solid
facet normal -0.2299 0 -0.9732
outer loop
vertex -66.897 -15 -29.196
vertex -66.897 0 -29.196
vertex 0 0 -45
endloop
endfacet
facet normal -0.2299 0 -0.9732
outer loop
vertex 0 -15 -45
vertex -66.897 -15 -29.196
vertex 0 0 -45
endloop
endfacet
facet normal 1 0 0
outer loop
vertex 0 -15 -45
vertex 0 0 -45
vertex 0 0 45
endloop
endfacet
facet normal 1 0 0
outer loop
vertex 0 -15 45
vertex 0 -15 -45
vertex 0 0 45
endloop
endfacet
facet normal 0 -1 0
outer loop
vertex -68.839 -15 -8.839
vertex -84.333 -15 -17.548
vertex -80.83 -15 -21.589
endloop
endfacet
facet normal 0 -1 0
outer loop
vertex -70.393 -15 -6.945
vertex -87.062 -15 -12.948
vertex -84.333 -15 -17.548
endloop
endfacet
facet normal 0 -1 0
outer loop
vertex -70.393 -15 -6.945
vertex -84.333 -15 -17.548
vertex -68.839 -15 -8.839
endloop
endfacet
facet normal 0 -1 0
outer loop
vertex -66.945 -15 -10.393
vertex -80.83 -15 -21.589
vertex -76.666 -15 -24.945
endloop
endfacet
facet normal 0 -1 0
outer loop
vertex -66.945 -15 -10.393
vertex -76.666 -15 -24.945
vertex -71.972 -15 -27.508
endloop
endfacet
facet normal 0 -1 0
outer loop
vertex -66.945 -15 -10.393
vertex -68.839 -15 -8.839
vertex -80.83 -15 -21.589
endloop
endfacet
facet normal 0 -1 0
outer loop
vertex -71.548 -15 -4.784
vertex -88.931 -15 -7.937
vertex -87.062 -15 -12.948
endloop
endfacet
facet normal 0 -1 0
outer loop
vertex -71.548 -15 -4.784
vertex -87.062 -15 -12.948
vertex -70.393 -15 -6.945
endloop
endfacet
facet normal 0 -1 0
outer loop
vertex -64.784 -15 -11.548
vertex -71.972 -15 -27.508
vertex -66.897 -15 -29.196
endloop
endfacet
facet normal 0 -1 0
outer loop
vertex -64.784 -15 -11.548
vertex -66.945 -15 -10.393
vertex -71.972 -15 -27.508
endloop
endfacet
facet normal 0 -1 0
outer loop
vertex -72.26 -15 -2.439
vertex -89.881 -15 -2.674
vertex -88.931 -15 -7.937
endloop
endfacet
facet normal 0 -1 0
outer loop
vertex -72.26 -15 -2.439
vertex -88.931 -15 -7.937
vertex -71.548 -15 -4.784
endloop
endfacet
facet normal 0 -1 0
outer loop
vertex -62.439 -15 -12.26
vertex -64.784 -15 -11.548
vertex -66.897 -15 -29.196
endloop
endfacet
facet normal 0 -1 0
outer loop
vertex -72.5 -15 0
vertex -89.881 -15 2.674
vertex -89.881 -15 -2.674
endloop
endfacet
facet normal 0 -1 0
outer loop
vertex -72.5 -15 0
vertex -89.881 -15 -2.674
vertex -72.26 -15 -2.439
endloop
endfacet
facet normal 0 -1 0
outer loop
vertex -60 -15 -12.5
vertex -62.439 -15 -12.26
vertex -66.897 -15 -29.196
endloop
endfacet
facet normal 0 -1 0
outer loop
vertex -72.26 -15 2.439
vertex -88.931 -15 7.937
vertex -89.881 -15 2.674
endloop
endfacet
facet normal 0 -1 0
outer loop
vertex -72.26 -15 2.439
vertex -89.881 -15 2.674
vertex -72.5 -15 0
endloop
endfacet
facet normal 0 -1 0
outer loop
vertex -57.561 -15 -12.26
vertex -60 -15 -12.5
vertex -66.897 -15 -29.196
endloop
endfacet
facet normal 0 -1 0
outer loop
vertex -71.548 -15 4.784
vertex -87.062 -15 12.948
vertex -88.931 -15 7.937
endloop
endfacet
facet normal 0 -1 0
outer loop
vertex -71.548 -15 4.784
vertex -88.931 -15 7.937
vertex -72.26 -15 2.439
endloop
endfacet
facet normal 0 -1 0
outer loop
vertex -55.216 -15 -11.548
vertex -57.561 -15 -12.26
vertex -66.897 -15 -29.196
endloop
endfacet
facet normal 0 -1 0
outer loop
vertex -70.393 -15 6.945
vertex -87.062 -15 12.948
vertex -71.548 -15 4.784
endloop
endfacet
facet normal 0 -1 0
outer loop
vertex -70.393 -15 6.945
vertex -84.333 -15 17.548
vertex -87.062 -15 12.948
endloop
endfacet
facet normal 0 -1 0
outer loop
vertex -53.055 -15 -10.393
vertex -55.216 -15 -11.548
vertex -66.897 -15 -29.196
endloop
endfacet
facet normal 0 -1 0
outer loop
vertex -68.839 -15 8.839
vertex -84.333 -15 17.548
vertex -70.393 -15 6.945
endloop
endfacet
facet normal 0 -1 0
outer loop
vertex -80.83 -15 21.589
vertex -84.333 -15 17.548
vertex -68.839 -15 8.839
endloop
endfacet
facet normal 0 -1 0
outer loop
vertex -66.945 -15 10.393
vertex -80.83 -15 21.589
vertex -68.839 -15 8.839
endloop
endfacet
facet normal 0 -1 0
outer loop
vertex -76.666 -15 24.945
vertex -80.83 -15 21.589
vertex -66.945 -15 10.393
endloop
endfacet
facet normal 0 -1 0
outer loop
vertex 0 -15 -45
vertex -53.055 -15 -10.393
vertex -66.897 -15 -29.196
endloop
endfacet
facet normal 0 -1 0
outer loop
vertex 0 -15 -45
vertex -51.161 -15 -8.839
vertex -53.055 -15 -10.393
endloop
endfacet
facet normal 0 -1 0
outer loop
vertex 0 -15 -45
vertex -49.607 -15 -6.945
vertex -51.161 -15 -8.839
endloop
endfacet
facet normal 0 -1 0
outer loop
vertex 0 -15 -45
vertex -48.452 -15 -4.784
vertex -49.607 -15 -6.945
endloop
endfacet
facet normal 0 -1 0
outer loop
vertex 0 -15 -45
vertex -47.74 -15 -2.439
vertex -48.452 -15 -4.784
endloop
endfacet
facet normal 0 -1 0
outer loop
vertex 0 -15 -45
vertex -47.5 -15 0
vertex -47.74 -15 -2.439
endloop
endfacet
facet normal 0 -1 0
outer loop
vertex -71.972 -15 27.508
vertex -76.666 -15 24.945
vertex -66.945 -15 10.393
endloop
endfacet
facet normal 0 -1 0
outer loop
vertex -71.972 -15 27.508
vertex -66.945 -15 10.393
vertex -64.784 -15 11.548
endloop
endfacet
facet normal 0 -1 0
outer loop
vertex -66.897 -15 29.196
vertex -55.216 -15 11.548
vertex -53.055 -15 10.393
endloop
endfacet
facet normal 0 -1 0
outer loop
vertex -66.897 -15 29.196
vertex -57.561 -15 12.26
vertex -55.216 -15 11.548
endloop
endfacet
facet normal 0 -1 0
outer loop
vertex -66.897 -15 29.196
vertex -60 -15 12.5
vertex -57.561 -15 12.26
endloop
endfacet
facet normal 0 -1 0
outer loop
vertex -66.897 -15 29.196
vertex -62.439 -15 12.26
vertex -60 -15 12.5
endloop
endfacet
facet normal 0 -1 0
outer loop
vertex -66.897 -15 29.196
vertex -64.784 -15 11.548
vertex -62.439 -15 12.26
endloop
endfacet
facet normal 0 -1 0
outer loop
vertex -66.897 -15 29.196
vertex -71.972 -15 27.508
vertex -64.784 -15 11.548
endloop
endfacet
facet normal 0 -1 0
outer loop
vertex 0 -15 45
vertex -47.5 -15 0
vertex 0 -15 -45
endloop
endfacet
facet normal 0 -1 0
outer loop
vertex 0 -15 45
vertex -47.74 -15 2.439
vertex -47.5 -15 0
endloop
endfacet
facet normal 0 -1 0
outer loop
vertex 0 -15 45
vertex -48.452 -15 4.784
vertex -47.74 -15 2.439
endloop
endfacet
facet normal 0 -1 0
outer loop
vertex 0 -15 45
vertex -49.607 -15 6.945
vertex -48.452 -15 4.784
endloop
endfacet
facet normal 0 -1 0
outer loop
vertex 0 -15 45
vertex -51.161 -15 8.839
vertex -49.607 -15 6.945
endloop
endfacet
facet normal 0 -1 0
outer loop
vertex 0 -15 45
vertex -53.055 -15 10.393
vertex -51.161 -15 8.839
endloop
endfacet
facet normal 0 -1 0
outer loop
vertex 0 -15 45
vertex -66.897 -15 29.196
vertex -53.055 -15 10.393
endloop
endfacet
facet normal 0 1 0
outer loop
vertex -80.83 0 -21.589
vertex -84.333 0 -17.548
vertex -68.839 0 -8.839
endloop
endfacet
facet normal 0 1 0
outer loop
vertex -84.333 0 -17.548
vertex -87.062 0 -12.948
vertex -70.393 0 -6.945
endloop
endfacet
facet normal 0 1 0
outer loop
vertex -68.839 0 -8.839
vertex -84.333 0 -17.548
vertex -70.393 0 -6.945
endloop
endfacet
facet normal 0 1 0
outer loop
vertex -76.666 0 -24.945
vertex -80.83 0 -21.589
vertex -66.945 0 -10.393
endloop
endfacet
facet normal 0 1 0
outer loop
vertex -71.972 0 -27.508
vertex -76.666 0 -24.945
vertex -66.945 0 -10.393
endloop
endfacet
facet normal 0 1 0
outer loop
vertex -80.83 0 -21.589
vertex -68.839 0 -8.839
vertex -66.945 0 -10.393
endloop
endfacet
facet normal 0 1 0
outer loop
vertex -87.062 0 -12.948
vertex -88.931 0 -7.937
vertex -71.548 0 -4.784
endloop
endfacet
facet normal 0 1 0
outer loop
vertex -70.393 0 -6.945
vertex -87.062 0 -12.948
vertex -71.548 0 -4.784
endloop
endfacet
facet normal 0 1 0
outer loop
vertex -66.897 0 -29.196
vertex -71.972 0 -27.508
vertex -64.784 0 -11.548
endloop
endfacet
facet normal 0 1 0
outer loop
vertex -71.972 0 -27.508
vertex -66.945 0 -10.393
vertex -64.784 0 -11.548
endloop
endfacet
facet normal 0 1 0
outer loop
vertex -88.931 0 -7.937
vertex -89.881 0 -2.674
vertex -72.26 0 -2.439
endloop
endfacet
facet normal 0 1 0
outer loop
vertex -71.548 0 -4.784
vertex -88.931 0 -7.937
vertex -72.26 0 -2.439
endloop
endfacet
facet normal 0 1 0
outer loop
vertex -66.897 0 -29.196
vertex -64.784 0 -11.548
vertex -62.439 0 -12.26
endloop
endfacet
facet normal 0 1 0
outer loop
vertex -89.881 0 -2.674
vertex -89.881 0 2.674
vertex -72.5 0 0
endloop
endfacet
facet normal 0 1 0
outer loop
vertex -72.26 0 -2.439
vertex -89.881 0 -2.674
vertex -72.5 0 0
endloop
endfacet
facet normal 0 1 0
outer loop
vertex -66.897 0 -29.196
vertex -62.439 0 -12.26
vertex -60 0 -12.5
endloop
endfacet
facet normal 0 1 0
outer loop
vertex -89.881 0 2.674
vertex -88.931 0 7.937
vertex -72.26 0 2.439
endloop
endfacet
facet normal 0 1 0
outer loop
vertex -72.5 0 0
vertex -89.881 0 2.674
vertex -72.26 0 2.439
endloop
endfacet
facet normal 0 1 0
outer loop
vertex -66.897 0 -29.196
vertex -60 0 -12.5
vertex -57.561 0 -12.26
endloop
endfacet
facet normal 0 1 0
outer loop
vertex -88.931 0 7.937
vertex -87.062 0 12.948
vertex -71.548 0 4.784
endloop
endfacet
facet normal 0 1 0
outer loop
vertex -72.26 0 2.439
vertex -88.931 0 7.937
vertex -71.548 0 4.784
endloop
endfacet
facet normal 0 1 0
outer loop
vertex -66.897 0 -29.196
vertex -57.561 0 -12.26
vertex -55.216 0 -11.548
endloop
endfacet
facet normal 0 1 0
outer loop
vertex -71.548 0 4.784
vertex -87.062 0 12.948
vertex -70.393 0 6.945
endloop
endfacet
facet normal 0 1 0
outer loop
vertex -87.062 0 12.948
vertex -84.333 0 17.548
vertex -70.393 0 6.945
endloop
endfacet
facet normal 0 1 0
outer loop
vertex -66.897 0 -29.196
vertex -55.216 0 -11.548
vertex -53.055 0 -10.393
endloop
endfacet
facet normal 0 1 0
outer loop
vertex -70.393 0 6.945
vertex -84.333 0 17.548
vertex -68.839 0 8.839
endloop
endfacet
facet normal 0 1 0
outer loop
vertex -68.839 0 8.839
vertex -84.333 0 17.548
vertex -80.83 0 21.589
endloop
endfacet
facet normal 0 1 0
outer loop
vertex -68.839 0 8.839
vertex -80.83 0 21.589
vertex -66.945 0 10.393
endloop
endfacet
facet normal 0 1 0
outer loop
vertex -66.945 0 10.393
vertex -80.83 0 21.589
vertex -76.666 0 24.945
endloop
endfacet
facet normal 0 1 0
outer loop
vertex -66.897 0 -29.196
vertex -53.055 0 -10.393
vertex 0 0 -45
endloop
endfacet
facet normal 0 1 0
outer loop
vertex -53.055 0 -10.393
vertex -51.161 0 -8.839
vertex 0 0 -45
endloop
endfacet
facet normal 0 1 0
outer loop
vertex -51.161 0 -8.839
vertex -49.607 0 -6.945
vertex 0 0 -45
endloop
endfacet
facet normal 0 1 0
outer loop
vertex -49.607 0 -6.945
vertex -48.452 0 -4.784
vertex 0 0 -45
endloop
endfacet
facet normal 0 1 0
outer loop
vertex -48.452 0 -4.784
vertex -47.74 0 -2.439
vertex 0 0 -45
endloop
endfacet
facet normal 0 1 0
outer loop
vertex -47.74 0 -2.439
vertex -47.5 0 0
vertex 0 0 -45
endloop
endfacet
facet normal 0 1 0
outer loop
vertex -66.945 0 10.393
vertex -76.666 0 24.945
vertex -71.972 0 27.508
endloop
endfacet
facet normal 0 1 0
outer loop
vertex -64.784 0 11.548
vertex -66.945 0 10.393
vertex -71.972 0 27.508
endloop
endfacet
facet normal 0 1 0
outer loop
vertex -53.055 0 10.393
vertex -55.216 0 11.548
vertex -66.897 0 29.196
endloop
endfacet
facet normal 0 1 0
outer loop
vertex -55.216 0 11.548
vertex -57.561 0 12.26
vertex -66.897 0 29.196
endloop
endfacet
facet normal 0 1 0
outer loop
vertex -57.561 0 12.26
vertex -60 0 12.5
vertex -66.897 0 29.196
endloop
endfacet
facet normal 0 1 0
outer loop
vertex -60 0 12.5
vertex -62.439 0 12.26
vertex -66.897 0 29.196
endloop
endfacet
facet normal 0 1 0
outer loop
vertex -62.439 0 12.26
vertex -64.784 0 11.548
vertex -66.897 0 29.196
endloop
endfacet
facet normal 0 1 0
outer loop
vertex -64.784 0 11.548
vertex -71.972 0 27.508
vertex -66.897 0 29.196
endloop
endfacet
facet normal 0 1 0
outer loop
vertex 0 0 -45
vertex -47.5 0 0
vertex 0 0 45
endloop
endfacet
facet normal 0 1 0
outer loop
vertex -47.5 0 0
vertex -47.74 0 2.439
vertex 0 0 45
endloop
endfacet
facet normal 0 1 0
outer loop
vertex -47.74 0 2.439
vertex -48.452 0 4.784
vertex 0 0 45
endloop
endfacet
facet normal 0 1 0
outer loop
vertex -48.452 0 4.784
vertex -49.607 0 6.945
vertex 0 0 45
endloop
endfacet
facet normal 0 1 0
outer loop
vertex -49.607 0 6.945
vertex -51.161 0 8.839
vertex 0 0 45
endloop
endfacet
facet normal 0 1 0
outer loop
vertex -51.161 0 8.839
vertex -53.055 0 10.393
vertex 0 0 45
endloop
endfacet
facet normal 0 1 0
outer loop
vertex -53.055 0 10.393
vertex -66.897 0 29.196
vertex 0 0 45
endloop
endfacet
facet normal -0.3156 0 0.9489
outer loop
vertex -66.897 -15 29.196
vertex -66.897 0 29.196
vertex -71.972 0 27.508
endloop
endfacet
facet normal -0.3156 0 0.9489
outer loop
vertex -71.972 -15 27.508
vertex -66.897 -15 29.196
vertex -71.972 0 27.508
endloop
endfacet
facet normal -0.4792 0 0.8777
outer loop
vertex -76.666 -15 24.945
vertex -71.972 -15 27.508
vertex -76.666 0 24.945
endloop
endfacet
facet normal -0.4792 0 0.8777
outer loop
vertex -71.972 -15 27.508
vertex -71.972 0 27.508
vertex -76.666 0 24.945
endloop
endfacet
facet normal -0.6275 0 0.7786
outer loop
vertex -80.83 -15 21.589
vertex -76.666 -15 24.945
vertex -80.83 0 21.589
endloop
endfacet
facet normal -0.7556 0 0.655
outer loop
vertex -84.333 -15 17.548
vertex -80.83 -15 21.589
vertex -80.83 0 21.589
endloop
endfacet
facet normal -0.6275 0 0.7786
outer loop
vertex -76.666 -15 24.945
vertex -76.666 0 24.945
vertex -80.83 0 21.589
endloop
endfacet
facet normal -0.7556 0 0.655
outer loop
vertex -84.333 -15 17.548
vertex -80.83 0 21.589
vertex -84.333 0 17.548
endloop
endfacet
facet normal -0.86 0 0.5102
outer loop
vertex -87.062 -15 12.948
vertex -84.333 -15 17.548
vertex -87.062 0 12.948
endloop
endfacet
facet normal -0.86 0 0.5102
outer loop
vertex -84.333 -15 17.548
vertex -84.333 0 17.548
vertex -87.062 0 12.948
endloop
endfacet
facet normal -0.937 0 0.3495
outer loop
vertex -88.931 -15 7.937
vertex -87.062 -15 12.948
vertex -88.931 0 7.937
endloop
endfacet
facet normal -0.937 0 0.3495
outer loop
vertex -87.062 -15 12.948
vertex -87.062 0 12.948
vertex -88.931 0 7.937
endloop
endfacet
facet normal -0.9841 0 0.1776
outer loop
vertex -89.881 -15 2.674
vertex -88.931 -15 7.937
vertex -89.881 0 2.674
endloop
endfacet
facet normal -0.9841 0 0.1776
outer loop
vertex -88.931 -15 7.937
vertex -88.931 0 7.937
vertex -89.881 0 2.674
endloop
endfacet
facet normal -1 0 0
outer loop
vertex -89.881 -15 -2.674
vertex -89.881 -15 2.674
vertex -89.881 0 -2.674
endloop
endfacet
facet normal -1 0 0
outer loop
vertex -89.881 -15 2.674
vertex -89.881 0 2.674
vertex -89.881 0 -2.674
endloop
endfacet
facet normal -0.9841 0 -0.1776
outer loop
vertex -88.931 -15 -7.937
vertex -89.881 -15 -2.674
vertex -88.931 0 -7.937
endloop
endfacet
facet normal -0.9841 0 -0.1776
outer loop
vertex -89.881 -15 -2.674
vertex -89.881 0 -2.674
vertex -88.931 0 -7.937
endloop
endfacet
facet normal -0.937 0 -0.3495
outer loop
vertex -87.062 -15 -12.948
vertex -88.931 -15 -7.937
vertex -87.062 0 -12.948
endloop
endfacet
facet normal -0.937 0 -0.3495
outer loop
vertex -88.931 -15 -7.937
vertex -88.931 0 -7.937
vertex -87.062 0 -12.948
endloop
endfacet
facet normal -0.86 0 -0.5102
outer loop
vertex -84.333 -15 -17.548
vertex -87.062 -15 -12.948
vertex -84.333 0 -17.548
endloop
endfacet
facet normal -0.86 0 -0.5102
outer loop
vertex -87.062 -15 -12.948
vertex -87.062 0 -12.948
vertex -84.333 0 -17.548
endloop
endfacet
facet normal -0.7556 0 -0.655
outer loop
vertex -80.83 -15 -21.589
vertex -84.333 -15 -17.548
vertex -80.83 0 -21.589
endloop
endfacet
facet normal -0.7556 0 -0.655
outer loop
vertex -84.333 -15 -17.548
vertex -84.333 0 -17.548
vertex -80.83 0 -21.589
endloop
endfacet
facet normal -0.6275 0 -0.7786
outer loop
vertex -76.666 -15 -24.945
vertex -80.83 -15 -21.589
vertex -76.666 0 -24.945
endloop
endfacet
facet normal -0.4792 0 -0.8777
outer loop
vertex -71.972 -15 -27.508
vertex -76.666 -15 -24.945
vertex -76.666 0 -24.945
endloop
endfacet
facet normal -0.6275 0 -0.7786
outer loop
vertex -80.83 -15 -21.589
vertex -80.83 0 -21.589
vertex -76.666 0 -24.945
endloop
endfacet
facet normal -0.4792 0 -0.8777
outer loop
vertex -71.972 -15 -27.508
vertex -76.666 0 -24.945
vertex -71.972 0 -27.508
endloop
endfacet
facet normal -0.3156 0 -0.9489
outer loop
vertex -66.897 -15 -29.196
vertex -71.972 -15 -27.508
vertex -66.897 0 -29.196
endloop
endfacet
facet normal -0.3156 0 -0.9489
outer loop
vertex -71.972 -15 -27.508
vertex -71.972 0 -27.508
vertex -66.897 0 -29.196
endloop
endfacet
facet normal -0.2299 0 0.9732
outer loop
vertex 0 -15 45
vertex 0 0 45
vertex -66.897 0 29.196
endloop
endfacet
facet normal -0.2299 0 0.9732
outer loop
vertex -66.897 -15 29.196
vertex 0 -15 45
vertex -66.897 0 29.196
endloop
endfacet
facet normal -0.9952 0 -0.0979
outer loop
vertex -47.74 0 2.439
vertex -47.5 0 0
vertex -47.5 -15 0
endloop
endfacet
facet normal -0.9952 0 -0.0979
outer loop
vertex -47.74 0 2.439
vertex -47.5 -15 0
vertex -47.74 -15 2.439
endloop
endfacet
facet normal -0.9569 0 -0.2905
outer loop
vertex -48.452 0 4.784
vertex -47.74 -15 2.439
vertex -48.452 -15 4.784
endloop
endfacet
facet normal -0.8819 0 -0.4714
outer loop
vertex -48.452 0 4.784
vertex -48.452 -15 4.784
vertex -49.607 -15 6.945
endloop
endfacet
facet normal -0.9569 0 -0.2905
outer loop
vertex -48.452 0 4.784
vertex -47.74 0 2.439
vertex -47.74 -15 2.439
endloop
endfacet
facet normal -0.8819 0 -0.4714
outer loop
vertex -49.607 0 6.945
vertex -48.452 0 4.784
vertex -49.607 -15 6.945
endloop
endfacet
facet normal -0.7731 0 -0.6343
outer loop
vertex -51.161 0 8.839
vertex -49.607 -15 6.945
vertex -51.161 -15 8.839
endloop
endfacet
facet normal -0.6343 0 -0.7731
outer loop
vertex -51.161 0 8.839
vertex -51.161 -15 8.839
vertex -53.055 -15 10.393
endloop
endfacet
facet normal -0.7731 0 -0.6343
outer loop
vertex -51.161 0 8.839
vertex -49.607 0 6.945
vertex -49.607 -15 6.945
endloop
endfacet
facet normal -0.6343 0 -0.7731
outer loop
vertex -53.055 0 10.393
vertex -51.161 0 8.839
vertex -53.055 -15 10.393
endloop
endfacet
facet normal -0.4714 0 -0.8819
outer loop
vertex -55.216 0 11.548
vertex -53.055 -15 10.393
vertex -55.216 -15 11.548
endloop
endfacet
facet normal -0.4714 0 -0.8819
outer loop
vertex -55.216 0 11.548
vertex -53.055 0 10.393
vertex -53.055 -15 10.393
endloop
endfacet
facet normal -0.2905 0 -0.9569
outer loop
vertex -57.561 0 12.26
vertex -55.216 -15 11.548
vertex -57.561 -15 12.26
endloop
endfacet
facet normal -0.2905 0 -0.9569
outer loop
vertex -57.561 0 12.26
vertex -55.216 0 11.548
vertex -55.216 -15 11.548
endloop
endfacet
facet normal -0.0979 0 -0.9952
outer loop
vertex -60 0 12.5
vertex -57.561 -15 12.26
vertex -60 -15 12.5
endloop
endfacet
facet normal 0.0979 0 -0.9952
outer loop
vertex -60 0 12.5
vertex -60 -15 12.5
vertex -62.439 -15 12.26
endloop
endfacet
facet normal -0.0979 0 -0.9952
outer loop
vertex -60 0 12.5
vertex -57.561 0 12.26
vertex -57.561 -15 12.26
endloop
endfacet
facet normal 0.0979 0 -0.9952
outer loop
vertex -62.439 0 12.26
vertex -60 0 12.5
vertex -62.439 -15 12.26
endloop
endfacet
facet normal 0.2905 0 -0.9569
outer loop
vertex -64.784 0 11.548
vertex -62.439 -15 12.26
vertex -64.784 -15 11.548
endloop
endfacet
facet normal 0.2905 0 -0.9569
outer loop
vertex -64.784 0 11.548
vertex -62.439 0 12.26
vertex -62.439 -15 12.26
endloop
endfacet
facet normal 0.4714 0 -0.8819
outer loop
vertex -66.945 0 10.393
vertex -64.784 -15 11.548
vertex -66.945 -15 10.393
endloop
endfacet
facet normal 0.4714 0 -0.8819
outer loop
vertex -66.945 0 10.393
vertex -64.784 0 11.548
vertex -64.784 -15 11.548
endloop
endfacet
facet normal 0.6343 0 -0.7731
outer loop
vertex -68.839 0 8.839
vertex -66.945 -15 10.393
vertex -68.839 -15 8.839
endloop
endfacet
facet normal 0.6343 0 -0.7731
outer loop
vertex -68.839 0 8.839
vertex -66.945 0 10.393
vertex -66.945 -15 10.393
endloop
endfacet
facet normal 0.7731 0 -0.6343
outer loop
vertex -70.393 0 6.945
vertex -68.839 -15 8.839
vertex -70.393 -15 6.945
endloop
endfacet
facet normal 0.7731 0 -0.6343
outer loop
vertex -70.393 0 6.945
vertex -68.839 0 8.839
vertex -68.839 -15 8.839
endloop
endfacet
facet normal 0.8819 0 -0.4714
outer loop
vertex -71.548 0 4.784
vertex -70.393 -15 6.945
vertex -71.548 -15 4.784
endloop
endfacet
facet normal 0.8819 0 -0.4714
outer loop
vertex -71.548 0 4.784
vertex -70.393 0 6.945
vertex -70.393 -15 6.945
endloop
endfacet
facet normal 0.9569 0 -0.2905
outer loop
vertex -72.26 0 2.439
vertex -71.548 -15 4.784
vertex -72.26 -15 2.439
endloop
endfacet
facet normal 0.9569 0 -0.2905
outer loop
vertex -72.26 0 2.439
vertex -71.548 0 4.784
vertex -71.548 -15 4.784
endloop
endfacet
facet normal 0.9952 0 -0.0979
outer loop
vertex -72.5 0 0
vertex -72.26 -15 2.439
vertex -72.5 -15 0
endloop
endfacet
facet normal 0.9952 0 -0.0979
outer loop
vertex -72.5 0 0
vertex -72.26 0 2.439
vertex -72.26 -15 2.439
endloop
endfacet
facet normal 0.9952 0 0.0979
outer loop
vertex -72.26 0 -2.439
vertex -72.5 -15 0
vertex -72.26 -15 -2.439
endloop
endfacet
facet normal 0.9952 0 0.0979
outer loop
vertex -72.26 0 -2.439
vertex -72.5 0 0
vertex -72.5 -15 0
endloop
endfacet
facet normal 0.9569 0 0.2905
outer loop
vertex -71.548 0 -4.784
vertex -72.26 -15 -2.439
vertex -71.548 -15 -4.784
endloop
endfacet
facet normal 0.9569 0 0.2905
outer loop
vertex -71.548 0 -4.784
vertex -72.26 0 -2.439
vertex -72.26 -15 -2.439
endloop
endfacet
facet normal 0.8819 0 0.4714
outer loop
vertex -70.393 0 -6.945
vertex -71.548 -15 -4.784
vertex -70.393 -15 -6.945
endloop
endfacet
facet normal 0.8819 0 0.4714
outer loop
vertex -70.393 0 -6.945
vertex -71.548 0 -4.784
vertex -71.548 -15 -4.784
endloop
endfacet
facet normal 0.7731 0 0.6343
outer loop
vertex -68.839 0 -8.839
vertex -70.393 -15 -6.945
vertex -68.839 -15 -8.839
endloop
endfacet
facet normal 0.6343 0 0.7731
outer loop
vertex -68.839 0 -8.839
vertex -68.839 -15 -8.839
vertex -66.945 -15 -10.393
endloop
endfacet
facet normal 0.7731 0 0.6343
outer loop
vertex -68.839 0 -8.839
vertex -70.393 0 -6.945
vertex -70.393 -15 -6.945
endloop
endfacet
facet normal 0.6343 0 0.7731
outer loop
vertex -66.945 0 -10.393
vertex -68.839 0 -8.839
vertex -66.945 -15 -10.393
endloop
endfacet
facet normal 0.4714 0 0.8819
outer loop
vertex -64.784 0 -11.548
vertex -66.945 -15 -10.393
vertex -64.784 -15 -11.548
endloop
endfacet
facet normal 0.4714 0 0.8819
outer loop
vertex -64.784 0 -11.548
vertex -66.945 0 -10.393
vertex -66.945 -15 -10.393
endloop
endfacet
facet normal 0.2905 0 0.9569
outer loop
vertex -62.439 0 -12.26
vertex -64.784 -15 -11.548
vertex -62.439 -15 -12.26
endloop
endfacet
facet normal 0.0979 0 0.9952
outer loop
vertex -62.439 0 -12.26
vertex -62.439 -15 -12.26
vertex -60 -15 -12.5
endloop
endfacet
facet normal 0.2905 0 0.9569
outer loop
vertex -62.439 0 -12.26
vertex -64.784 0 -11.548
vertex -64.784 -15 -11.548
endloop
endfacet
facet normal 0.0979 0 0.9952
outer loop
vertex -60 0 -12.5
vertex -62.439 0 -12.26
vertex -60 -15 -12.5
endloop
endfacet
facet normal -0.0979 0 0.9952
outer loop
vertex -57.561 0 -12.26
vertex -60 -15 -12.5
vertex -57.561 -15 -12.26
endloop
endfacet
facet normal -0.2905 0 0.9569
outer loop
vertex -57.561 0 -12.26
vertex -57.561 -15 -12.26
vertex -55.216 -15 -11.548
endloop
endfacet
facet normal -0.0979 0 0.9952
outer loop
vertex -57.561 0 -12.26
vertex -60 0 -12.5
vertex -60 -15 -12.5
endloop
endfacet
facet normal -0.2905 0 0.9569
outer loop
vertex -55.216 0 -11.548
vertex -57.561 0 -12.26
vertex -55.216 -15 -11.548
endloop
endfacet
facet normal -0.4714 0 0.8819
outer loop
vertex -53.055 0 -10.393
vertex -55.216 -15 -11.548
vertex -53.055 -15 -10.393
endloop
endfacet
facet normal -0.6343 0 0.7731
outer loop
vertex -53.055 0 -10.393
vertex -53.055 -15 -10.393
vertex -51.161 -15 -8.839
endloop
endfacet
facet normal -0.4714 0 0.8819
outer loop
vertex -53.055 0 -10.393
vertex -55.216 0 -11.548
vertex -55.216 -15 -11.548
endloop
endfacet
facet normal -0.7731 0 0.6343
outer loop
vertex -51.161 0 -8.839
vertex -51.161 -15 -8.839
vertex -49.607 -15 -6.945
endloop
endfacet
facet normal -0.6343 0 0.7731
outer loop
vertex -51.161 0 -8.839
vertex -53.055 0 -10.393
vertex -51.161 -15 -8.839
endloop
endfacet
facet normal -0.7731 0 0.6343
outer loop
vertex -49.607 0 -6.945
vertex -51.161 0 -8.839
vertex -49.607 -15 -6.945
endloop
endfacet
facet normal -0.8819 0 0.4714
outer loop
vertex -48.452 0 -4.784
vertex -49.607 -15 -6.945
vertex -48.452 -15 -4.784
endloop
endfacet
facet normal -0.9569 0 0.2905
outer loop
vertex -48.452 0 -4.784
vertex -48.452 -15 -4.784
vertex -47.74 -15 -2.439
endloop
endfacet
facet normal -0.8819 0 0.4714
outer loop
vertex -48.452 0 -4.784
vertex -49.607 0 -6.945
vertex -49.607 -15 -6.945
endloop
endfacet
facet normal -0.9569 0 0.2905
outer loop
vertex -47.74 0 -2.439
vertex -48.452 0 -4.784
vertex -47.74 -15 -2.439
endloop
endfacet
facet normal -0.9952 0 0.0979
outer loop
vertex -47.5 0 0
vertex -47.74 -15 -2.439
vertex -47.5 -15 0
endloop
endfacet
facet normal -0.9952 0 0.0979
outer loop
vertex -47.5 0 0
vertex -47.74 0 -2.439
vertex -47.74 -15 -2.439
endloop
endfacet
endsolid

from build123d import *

# Parameters (mm, degrees)
F0_R     = 12.5
F1_DEPTH = 15


with BuildPart() as f1:
    # F0 (on Front) → F1 (new body)
    with BuildSketch(Plane.XZ):
        with BuildLine():
            ThreePointArc((-66.897273, -29.196363), (-41.384391, -23.525711), (-30, 0))
            ThreePointArc((-30, 0), (-41.384391, 23.525711), (-66.897273, 29.196363))
            ThreePointArc((-66.897273, 29.196363), (-90, 0), (-66.897273, -29.196363))
        make_face()
        with Locations((-60, 0)):
            Circle(F0_R, mode=Mode.SUBTRACT)
        with BuildLine():
            ThreePointArc((-66.897273, 29.196363), (-41.384391, 23.525711), (-30, 0))
            ThreePointArc((-30, 0), (-41.384391, -23.525711), (-66.897273, -29.196363))
            Line((-66.897273, -29.196363), (0, -45))
            Line((0, -45), (0, 45))
            Line((0, 45), (-66.897273, 29.196363))
        make_face()
    extrude(amount=F1_DEPTH)


solid = f1.part
